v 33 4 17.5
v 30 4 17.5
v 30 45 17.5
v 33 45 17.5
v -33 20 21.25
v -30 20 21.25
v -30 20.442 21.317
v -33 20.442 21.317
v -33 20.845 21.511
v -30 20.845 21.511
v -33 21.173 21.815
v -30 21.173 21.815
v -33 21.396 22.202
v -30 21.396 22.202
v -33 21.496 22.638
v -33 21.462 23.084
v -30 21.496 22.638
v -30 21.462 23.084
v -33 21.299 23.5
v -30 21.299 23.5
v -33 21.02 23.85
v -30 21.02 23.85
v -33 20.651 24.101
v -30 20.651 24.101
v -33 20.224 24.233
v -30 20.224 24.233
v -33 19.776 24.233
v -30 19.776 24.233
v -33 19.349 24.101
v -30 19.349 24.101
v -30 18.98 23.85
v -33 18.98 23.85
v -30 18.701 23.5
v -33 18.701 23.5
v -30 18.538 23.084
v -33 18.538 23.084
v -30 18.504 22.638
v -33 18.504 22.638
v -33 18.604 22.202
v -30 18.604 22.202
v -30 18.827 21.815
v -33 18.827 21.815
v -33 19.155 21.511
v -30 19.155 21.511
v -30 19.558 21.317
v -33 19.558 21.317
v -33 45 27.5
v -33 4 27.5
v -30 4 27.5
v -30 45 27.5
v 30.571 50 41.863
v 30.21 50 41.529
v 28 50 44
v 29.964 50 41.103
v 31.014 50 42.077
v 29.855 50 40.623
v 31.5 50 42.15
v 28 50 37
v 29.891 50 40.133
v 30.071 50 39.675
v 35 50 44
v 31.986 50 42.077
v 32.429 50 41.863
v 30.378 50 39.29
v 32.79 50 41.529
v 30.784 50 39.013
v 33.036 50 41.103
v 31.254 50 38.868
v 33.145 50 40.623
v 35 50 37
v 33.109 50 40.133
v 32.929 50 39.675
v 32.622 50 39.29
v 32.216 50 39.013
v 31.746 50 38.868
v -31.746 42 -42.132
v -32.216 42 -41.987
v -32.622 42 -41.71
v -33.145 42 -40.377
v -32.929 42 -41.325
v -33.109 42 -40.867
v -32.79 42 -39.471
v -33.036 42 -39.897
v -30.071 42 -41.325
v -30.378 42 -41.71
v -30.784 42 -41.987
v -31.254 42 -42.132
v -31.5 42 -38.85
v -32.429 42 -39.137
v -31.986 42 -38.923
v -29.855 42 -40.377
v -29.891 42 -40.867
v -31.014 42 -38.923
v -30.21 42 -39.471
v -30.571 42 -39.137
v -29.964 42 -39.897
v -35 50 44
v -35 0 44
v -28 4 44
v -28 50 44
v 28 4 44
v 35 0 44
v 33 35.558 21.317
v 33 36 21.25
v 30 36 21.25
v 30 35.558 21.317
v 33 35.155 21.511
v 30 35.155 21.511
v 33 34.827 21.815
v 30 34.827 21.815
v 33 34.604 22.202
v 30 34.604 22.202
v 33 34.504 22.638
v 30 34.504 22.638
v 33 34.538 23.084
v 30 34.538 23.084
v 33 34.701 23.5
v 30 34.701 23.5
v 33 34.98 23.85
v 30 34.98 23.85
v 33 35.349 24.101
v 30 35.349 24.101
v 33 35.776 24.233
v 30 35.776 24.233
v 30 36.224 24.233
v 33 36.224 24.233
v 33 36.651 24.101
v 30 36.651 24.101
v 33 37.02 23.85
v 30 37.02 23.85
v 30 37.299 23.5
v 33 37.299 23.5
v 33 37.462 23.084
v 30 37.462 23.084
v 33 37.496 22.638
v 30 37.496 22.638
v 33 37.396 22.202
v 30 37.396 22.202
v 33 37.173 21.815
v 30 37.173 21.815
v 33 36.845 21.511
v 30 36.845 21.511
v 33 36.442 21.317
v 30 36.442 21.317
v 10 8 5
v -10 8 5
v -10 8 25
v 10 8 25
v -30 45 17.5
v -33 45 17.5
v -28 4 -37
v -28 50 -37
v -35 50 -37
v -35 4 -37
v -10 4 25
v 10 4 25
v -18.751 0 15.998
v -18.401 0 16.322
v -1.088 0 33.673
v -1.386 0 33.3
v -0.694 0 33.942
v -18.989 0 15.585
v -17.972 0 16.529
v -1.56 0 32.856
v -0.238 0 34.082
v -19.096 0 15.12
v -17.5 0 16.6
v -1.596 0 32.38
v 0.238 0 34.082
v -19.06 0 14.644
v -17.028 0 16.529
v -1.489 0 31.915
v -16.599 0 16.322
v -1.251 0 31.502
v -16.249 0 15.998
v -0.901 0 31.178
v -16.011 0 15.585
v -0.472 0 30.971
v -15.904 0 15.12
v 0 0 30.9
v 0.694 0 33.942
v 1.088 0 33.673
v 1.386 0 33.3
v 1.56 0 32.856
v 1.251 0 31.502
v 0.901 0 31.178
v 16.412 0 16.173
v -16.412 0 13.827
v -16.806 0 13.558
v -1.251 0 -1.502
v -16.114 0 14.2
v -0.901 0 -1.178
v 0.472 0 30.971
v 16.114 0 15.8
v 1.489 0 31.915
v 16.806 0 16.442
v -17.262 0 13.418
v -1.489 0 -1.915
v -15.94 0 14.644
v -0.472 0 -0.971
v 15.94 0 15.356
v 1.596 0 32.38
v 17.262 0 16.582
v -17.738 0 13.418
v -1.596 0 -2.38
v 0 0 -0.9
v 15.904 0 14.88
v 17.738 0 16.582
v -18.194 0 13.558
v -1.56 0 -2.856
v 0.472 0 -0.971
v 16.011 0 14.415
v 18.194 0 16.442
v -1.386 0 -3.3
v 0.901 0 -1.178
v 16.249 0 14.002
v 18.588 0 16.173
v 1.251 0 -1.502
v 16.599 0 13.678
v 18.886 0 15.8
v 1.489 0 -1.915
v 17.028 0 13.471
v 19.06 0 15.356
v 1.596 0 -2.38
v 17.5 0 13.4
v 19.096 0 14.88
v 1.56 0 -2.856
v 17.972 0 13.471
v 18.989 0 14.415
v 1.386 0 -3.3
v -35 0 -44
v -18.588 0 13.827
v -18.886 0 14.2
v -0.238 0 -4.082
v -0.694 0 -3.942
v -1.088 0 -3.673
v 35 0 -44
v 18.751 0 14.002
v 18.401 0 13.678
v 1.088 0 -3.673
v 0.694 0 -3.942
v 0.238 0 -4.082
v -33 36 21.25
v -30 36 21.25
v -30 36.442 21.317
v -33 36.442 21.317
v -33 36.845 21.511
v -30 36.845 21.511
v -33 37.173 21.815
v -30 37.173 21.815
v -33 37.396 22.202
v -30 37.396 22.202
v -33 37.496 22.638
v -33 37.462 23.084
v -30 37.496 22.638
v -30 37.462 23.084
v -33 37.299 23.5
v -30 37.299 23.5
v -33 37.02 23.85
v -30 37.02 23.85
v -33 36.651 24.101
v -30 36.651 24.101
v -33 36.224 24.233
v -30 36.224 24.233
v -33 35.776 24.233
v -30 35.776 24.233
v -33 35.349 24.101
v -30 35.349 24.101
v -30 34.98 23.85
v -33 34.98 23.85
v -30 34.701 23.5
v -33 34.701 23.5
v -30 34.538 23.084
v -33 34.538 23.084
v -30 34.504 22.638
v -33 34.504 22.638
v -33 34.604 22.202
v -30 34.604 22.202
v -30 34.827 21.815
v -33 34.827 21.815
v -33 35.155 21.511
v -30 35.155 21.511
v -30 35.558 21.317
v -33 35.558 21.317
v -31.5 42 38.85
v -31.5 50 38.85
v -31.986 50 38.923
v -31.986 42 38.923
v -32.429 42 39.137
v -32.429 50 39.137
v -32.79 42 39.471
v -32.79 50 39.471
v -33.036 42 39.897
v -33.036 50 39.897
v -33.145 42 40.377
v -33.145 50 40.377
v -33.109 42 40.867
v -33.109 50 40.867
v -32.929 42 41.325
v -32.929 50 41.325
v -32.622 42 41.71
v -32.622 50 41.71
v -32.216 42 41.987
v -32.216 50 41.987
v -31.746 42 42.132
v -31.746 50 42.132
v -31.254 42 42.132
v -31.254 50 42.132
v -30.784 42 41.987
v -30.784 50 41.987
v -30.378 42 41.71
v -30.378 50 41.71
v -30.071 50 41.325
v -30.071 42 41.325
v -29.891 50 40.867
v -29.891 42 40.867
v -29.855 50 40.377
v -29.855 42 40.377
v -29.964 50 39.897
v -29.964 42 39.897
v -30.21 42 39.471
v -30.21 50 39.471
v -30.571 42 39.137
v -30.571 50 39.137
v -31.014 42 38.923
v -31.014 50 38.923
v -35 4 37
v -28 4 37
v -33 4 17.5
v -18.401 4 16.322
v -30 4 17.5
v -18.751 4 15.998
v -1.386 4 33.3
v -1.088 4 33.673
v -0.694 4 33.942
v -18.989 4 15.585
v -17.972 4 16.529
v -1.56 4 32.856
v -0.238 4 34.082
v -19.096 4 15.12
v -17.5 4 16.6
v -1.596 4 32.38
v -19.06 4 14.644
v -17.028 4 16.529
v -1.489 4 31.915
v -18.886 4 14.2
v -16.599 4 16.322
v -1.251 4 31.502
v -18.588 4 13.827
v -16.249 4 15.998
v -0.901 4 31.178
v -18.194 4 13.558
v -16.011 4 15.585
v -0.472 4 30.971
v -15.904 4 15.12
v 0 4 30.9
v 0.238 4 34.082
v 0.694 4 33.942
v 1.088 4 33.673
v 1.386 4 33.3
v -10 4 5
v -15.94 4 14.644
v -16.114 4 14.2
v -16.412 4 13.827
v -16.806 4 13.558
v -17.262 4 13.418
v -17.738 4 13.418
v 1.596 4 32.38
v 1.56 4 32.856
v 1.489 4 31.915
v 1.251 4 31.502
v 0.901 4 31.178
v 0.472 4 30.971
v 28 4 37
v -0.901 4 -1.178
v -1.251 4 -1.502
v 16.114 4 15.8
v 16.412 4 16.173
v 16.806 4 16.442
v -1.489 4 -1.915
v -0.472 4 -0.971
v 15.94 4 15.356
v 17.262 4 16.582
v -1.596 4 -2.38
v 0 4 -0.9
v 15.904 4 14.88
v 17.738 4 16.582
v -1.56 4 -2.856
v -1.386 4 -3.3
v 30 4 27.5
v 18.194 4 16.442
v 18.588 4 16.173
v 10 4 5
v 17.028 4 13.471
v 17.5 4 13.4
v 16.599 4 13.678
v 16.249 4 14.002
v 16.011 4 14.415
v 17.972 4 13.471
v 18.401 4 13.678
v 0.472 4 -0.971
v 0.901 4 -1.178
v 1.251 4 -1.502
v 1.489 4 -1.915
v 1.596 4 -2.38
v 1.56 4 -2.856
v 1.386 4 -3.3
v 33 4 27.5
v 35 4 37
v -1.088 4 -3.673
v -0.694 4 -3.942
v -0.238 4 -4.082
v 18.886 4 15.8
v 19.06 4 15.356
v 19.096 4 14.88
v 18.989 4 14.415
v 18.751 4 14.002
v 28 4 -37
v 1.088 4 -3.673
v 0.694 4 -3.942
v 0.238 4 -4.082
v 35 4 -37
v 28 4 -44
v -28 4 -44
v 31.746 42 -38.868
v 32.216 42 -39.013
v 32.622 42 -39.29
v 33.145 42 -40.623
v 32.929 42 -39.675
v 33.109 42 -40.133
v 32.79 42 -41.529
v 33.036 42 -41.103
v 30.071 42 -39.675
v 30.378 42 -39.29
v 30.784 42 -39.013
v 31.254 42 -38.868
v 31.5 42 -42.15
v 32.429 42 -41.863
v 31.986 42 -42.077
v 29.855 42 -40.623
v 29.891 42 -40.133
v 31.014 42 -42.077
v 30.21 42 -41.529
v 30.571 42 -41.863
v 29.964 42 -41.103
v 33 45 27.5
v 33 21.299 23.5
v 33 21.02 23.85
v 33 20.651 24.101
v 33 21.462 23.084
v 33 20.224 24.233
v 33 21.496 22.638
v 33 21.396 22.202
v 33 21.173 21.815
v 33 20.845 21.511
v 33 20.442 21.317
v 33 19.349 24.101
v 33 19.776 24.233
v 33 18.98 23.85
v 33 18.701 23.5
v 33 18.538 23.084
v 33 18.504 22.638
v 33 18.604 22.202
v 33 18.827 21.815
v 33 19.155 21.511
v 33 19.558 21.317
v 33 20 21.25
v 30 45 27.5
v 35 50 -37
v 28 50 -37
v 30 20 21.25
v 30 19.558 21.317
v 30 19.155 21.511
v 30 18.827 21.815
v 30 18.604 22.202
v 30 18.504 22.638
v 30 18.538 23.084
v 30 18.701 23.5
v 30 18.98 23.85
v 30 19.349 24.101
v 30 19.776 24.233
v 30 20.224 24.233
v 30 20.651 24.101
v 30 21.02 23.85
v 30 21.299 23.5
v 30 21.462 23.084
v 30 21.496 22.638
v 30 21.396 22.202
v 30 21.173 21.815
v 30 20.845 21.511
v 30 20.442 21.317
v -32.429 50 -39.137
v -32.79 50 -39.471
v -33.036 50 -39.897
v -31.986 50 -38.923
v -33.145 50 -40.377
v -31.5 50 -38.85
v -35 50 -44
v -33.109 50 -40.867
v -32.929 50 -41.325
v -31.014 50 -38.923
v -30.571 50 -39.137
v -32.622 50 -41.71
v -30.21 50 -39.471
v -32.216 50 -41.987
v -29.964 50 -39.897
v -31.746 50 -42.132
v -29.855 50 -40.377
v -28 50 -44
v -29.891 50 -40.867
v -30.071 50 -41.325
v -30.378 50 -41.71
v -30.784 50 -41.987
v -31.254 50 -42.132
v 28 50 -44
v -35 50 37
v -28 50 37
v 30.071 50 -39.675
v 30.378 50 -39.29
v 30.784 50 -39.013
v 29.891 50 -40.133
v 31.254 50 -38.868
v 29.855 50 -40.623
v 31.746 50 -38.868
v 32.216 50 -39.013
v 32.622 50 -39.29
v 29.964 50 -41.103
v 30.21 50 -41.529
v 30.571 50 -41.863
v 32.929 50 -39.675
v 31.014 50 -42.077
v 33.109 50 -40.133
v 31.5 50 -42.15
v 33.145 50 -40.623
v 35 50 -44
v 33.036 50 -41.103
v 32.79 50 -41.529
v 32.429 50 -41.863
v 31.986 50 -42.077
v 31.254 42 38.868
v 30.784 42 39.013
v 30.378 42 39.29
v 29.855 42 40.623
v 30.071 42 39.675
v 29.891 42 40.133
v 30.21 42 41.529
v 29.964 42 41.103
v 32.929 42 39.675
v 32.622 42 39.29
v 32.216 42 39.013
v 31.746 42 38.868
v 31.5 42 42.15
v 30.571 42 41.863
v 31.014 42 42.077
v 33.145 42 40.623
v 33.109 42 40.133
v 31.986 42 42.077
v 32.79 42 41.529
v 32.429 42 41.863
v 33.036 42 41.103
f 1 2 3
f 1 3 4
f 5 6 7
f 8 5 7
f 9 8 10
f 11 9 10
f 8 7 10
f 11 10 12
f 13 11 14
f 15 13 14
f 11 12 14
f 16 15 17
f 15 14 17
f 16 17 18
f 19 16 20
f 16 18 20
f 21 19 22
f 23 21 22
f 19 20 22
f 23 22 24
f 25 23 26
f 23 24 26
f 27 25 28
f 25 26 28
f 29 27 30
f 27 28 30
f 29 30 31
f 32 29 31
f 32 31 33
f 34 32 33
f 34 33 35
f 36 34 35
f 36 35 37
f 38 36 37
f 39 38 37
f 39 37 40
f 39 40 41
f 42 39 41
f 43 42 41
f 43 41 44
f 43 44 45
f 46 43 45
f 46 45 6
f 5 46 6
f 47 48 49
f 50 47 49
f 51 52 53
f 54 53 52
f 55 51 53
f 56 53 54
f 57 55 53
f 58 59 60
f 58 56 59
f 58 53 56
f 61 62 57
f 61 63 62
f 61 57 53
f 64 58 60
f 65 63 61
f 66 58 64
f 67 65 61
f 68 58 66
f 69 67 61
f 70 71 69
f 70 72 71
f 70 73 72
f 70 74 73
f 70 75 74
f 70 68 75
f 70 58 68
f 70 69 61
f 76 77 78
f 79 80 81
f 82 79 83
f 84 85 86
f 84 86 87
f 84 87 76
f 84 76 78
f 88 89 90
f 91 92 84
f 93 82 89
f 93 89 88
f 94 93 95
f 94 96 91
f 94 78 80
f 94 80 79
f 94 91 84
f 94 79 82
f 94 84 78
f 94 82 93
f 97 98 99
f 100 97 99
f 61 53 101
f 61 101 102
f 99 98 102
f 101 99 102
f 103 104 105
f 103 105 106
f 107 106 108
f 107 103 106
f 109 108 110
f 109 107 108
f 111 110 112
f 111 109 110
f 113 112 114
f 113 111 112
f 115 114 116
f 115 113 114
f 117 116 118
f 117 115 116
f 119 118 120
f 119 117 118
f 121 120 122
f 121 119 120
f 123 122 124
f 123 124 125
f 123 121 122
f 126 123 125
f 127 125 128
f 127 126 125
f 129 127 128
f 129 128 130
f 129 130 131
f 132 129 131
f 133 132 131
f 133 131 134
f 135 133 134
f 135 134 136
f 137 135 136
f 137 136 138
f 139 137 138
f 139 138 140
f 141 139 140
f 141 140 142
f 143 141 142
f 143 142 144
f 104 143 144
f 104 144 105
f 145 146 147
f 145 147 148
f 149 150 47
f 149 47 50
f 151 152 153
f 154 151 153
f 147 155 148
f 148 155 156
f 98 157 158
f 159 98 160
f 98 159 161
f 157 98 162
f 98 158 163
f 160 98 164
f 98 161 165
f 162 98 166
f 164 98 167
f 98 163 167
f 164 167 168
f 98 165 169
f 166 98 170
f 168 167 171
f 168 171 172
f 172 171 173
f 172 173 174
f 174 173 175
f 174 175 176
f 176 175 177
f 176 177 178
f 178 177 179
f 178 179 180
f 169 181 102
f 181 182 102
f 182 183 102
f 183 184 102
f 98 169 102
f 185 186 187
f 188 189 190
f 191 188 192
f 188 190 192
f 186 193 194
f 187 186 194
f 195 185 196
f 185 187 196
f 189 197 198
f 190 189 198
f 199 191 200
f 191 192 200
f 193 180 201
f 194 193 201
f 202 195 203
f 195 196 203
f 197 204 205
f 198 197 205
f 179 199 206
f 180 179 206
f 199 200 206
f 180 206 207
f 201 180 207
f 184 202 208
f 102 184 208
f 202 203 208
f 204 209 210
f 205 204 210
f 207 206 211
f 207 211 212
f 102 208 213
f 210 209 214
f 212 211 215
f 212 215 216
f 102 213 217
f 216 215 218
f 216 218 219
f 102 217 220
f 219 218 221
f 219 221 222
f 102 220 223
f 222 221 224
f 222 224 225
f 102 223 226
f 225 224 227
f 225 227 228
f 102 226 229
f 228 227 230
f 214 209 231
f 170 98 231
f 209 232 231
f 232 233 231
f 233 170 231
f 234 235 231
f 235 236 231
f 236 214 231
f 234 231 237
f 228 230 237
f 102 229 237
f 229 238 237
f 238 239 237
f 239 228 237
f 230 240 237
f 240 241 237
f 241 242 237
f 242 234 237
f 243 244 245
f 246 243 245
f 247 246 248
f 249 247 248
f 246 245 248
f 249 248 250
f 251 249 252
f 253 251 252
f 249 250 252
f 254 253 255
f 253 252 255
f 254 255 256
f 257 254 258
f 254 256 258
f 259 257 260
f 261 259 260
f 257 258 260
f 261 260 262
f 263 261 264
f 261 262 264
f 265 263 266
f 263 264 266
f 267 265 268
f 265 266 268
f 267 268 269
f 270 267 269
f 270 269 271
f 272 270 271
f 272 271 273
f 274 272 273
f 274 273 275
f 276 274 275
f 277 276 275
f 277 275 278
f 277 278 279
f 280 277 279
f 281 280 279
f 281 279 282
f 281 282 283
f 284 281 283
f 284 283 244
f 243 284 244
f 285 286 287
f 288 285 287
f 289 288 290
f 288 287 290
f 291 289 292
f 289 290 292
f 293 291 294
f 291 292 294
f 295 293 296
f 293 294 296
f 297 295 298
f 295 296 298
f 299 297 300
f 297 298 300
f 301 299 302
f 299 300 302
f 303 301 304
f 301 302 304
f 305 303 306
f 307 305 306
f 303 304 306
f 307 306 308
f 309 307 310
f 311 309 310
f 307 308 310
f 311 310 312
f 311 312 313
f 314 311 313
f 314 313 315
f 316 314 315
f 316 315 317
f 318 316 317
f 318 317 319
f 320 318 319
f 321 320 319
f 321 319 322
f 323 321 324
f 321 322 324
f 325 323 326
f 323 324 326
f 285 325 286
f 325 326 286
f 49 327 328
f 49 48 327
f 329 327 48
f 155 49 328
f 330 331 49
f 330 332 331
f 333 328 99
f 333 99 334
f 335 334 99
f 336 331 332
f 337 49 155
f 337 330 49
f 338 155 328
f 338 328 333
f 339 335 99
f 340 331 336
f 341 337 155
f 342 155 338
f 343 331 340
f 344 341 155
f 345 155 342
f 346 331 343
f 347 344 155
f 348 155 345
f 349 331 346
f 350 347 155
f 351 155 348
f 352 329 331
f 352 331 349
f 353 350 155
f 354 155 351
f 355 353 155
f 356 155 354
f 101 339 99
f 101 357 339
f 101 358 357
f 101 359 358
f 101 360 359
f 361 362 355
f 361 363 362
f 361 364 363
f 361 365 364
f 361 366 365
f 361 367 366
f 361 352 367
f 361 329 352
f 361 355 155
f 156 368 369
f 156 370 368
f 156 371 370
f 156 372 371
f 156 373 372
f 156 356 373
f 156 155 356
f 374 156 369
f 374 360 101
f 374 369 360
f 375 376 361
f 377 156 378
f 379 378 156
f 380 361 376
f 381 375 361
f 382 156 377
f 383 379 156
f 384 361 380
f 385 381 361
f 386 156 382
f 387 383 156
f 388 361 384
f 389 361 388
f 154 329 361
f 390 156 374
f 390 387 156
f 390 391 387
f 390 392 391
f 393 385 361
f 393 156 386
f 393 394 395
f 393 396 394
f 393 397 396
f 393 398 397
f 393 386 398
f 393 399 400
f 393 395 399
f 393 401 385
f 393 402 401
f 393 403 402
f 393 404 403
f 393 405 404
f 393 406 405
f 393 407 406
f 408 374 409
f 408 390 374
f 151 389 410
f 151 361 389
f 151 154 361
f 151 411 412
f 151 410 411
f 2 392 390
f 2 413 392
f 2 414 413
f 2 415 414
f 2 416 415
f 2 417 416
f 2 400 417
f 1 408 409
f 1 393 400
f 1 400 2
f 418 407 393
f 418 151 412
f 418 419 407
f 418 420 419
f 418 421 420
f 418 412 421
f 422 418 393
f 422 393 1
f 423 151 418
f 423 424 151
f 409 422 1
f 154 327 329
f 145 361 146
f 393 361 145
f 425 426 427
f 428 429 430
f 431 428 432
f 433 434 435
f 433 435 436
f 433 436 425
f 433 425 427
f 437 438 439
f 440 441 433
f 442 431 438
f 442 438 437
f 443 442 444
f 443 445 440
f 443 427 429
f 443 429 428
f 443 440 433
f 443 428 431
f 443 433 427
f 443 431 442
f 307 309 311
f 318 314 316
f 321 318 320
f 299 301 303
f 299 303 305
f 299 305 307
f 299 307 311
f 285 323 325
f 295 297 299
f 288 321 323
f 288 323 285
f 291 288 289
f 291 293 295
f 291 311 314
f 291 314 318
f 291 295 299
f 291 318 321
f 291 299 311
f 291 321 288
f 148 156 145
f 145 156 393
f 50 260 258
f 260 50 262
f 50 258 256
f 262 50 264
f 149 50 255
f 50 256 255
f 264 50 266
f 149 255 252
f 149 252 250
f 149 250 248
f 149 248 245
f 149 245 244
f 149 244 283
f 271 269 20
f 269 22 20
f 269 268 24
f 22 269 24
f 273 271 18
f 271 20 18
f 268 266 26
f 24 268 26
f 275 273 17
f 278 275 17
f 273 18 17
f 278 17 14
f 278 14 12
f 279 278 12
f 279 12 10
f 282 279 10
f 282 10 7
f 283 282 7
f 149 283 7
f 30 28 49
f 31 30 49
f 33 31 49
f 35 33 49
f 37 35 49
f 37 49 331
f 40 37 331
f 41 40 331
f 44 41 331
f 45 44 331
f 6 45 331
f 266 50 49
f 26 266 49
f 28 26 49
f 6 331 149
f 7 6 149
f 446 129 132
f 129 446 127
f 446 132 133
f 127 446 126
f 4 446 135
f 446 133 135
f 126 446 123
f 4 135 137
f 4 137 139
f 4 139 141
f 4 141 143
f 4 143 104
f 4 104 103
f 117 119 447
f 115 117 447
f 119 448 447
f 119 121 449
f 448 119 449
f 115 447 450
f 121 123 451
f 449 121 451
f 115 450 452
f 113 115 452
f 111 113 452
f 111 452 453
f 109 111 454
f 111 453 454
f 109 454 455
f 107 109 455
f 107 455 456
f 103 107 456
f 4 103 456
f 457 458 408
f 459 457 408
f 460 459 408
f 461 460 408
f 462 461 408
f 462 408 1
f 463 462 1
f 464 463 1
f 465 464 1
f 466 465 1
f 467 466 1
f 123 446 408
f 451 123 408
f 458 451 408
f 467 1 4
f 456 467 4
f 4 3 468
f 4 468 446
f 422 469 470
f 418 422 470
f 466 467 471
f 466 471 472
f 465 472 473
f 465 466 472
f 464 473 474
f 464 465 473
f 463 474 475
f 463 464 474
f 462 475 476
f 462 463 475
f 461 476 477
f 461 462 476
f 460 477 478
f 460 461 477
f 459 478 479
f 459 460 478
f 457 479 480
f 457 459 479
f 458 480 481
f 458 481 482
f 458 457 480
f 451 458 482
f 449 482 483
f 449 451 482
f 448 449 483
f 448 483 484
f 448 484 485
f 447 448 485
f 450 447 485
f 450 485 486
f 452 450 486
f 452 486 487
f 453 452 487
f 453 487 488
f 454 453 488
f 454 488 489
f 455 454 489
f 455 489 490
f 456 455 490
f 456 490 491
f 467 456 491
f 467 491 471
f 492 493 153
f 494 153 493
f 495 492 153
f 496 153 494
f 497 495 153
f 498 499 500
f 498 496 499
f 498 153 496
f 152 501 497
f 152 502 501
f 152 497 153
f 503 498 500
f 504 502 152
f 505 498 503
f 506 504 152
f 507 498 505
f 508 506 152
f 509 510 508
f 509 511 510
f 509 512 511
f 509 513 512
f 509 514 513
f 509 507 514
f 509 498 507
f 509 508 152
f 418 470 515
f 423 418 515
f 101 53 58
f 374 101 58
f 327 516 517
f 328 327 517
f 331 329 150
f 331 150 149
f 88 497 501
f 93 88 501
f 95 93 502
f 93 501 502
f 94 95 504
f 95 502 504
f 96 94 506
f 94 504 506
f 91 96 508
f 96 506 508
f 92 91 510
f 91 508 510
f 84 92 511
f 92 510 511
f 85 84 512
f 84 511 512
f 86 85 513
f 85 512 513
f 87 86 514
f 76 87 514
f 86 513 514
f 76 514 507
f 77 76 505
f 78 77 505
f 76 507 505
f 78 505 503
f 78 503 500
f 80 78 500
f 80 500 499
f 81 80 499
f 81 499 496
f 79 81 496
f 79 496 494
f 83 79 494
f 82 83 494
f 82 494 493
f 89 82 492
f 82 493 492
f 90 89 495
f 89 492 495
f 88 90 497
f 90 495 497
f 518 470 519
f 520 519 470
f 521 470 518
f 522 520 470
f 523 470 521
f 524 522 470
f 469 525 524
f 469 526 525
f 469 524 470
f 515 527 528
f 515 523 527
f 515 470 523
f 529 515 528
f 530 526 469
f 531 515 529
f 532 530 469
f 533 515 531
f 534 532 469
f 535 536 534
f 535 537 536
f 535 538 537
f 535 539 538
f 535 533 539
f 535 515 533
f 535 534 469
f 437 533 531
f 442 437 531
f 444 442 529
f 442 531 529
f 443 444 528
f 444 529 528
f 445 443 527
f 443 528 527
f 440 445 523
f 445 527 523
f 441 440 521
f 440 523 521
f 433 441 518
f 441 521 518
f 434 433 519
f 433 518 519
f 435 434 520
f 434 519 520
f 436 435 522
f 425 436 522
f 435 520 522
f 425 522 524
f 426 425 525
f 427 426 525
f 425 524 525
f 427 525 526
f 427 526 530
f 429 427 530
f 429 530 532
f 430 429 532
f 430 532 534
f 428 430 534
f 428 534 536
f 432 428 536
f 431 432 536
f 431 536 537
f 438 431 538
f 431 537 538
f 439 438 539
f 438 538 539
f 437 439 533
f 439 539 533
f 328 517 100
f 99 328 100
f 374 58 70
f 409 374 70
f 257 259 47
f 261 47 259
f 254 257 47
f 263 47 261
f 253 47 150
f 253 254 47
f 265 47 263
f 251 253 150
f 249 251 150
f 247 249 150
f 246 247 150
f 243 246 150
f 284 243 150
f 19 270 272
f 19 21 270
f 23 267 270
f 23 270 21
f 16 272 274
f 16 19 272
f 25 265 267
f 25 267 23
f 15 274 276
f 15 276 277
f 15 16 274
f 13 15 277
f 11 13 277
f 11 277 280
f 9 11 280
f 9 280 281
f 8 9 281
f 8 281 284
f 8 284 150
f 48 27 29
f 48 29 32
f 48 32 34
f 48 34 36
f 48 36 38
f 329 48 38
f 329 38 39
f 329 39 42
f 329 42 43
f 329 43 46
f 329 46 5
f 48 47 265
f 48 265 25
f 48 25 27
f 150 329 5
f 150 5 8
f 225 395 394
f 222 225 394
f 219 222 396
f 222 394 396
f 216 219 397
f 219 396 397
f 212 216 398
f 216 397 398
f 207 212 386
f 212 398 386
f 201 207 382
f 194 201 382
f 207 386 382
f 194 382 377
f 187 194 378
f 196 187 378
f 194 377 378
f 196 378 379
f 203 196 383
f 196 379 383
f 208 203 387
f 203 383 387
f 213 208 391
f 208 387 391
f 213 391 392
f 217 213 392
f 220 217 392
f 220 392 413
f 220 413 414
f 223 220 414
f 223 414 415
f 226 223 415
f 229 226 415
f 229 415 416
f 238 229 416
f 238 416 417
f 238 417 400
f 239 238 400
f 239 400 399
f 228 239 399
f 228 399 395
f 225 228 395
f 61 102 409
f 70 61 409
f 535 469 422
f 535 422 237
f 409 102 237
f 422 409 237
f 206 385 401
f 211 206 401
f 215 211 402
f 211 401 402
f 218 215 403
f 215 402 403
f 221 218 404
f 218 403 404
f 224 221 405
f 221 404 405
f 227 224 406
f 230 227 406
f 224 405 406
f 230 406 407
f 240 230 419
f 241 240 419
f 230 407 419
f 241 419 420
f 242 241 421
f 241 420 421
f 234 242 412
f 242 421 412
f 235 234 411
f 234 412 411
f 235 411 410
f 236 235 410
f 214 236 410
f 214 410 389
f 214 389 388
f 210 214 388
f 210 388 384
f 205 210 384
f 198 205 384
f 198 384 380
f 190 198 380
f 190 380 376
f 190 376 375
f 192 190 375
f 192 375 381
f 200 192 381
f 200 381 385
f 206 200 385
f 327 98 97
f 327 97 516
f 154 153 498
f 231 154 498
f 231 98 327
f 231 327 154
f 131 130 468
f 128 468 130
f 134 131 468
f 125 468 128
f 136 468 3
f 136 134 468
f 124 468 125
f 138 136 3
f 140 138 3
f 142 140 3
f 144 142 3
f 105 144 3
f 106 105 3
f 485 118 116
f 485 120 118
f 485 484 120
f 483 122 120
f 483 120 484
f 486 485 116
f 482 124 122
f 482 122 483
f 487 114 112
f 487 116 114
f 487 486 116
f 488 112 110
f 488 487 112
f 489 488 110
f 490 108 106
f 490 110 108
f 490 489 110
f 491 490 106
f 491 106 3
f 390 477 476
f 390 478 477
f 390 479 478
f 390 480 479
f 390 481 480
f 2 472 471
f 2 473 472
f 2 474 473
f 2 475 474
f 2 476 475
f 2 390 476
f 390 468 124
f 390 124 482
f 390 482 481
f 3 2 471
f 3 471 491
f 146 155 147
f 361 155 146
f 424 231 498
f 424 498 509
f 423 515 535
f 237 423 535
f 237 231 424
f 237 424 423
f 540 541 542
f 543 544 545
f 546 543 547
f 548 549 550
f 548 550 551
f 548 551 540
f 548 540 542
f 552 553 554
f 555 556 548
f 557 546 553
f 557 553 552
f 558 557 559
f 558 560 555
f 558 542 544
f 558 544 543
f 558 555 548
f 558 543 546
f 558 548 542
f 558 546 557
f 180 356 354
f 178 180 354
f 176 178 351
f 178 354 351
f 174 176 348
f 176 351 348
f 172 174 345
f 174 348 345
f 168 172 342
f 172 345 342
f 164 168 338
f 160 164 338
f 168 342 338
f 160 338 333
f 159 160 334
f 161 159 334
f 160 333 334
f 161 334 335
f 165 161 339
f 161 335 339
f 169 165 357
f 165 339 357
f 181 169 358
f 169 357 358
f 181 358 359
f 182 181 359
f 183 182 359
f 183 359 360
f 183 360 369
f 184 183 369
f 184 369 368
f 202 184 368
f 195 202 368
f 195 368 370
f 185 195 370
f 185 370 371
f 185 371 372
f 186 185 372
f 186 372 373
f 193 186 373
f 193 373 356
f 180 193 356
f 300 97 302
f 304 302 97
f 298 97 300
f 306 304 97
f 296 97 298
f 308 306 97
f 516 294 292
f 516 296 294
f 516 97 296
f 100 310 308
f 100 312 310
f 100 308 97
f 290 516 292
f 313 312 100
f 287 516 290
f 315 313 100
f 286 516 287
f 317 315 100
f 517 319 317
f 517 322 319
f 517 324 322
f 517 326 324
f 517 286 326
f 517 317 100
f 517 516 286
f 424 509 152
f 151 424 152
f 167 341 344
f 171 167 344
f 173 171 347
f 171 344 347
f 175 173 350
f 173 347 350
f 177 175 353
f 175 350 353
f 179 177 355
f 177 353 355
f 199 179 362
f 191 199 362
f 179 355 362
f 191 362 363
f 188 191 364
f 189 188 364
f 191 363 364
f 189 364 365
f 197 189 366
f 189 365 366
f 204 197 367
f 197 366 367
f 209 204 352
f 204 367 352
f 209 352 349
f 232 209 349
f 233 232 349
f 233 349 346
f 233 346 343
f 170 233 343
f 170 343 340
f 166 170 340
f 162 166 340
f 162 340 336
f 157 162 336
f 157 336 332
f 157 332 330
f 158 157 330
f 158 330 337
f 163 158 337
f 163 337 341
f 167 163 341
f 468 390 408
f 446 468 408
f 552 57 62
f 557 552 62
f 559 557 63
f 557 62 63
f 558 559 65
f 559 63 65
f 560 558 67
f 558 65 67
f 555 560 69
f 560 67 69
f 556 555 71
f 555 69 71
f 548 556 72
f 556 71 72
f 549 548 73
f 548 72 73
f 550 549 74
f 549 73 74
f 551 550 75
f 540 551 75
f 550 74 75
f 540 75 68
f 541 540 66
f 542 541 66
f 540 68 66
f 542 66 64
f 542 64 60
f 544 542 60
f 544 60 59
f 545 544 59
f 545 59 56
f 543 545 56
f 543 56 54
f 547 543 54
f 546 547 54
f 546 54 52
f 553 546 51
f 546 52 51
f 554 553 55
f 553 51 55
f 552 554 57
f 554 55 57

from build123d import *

# Parameters (mm, degrees)
SKETCH1_W           = 70
SKETCH1_H           = 88
BOSS_EXTRUDE1_DEPTH = 50
SKETCH2_R           = 1.65
CUT_EXTRUDE1_DEPTH  = 8
CUT_EXTRUDE2_DEPTH  = 46
SKETCH5_R           = 1.6
CUT_EXTRUDE4_DEPTH  = 73.642962495
SKETCH6_W           = 20
SKETCH6_H           = 20
BOSS_EXTRUDE2_DEPTH = 4
SKETCH7_W           = 3
SKETCH7_H           = 10
BOSS_EXTRUDE3_DEPTH = 41
SKETCH8_R           = 1.5
CUT_EXTRUDE5_DEPTH  = 10
CUT_EXTRUDE6_START  = -10
SKETCH9_R           = 1.5
CUT_EXTRUDE6_DEPTH  = 10


with BuildPart() as part:
    # Sketch1 → Boss-Extrude1 (new body)
    with BuildSketch(Plane(origin=(0, 0, 0), x_dir=(1, 0, 0), z_dir=(0, 1, 0))):
        Rectangle(SKETCH1_W, SKETCH1_H)
    extrude(amount=BOSS_EXTRUDE1_DEPTH)

    # Sketch2 → Cut-Extrude1 (cut)
    with BuildSketch(Plane(origin=(0, 50, 0), x_dir=(1, 0, 0), z_dir=(0, 1, 0))):
        with Locations(Location((-31.5, 40.5, 0), (0, 0, 270))):
            Circle(SKETCH2_R)
        with Locations(Location((31.5, 40.5, 0), (0, 0, 90))):
            Circle(SKETCH2_R)
        with Locations(Location((31.5, -40.5, 0), (0, 0, 270))):
            Circle(SKETCH2_R)
        with Locations(Location((-31.5, -40.5, 0), (0, 0, 90))):
            Circle(SKETCH2_R)
    extrude(amount=-CUT_EXTRUDE1_DEPTH, mode=Mode.SUBTRACT)

    # Sketch3 → Cut-Extrude2 (cut)
    with BuildSketch(Plane(origin=(0, 50, 0), x_dir=(1, 0, 0), z_dir=(0, 1, 0))):
        Polygon((-28, -44), (28, -44), (28, -37), (35, -37), (35, 37), (28, 37), (28, 44), (-28, 44), (-28, 37), (-35, 37), (-35, -37), (-28, -37), align=None)
    extrude(amount=-CUT_EXTRUDE2_DEPTH, mode=Mode.SUBTRACT)

    # Sketch5 → Cut-Extrude4 (cut, through all)
    with BuildSketch(Plane(origin=(0, 4, 0), x_dir=(1, 0, 0), z_dir=(0, 1, 0))):
        with Locations(Location((-17.5, -15, 0), (0, 0, 270))):
            Circle(SKETCH5_R)
        with Locations(Location((0, 2.5, 0), (0, 0, 270))):
            Circle(SKETCH5_R)
        with Locations(Location((0, -32.5, 0), (0, 0, 90))):
            Circle(SKETCH5_R)
        with Locations(Location((17.5, -15, 0), (0, 0, 90))):
            Circle(SKETCH5_R)
    extrude(amount=-CUT_EXTRUDE4_DEPTH, mode=Mode.SUBTRACT)

    # Sketch6 → Boss-Extrude2 (add)
    with BuildSketch(Plane(origin=(0, 4, 0), x_dir=(1, 0, 0), z_dir=(0, 1, 0))):
        with Locations((0, -15)):
            Rectangle(SKETCH6_W, SKETCH6_H)
    extrude(amount=BOSS_EXTRUDE2_DEPTH)

    # Sketch7 → Boss-Extrude3 (add)
    with BuildSketch(Plane(origin=(0, 4, 0), x_dir=(1, 0, 0), z_dir=(0, 1, 0))):
        with Locations((-31.5, -22.5)):
            Rectangle(SKETCH7_W, SKETCH7_H)
        with Locations((31.5, -22.5)):
            Rectangle(SKETCH7_W, SKETCH7_H)
    extrude(amount=BOSS_EXTRUDE3_DEPTH)

    # Sketch8 → Cut-Extrude5 (cut)
    with BuildSketch(Plane(origin=(-30, 0, 0), x_dir=(0, 0, -1), z_dir=(1, 0, 0))):
        with Locations((-22.75, 20)):
            Circle(SKETCH8_R)
        with Locations((-22.75, 36)):
            Circle(SKETCH8_R)
    extrude(amount=-CUT_EXTRUDE5_DEPTH, mode=Mode.SUBTRACT)

    # Sketch9 → Cut-Extrude6 (cut)
    with BuildSketch(Plane.ZY.offset(-30).offset(CUT_EXTRUDE6_START)):
        with Locations(Location((22.75, 20, 0), (0, 0, 180))):
            Circle(SKETCH9_R)
        with Locations(Location((22.75, 36, 0), (0, 0, 180))):
            Circle(SKETCH9_R)
    extrude(amount=CUT_EXTRUDE6_DEPTH, mode=Mode.SUBTRACT)


solid = part.part
